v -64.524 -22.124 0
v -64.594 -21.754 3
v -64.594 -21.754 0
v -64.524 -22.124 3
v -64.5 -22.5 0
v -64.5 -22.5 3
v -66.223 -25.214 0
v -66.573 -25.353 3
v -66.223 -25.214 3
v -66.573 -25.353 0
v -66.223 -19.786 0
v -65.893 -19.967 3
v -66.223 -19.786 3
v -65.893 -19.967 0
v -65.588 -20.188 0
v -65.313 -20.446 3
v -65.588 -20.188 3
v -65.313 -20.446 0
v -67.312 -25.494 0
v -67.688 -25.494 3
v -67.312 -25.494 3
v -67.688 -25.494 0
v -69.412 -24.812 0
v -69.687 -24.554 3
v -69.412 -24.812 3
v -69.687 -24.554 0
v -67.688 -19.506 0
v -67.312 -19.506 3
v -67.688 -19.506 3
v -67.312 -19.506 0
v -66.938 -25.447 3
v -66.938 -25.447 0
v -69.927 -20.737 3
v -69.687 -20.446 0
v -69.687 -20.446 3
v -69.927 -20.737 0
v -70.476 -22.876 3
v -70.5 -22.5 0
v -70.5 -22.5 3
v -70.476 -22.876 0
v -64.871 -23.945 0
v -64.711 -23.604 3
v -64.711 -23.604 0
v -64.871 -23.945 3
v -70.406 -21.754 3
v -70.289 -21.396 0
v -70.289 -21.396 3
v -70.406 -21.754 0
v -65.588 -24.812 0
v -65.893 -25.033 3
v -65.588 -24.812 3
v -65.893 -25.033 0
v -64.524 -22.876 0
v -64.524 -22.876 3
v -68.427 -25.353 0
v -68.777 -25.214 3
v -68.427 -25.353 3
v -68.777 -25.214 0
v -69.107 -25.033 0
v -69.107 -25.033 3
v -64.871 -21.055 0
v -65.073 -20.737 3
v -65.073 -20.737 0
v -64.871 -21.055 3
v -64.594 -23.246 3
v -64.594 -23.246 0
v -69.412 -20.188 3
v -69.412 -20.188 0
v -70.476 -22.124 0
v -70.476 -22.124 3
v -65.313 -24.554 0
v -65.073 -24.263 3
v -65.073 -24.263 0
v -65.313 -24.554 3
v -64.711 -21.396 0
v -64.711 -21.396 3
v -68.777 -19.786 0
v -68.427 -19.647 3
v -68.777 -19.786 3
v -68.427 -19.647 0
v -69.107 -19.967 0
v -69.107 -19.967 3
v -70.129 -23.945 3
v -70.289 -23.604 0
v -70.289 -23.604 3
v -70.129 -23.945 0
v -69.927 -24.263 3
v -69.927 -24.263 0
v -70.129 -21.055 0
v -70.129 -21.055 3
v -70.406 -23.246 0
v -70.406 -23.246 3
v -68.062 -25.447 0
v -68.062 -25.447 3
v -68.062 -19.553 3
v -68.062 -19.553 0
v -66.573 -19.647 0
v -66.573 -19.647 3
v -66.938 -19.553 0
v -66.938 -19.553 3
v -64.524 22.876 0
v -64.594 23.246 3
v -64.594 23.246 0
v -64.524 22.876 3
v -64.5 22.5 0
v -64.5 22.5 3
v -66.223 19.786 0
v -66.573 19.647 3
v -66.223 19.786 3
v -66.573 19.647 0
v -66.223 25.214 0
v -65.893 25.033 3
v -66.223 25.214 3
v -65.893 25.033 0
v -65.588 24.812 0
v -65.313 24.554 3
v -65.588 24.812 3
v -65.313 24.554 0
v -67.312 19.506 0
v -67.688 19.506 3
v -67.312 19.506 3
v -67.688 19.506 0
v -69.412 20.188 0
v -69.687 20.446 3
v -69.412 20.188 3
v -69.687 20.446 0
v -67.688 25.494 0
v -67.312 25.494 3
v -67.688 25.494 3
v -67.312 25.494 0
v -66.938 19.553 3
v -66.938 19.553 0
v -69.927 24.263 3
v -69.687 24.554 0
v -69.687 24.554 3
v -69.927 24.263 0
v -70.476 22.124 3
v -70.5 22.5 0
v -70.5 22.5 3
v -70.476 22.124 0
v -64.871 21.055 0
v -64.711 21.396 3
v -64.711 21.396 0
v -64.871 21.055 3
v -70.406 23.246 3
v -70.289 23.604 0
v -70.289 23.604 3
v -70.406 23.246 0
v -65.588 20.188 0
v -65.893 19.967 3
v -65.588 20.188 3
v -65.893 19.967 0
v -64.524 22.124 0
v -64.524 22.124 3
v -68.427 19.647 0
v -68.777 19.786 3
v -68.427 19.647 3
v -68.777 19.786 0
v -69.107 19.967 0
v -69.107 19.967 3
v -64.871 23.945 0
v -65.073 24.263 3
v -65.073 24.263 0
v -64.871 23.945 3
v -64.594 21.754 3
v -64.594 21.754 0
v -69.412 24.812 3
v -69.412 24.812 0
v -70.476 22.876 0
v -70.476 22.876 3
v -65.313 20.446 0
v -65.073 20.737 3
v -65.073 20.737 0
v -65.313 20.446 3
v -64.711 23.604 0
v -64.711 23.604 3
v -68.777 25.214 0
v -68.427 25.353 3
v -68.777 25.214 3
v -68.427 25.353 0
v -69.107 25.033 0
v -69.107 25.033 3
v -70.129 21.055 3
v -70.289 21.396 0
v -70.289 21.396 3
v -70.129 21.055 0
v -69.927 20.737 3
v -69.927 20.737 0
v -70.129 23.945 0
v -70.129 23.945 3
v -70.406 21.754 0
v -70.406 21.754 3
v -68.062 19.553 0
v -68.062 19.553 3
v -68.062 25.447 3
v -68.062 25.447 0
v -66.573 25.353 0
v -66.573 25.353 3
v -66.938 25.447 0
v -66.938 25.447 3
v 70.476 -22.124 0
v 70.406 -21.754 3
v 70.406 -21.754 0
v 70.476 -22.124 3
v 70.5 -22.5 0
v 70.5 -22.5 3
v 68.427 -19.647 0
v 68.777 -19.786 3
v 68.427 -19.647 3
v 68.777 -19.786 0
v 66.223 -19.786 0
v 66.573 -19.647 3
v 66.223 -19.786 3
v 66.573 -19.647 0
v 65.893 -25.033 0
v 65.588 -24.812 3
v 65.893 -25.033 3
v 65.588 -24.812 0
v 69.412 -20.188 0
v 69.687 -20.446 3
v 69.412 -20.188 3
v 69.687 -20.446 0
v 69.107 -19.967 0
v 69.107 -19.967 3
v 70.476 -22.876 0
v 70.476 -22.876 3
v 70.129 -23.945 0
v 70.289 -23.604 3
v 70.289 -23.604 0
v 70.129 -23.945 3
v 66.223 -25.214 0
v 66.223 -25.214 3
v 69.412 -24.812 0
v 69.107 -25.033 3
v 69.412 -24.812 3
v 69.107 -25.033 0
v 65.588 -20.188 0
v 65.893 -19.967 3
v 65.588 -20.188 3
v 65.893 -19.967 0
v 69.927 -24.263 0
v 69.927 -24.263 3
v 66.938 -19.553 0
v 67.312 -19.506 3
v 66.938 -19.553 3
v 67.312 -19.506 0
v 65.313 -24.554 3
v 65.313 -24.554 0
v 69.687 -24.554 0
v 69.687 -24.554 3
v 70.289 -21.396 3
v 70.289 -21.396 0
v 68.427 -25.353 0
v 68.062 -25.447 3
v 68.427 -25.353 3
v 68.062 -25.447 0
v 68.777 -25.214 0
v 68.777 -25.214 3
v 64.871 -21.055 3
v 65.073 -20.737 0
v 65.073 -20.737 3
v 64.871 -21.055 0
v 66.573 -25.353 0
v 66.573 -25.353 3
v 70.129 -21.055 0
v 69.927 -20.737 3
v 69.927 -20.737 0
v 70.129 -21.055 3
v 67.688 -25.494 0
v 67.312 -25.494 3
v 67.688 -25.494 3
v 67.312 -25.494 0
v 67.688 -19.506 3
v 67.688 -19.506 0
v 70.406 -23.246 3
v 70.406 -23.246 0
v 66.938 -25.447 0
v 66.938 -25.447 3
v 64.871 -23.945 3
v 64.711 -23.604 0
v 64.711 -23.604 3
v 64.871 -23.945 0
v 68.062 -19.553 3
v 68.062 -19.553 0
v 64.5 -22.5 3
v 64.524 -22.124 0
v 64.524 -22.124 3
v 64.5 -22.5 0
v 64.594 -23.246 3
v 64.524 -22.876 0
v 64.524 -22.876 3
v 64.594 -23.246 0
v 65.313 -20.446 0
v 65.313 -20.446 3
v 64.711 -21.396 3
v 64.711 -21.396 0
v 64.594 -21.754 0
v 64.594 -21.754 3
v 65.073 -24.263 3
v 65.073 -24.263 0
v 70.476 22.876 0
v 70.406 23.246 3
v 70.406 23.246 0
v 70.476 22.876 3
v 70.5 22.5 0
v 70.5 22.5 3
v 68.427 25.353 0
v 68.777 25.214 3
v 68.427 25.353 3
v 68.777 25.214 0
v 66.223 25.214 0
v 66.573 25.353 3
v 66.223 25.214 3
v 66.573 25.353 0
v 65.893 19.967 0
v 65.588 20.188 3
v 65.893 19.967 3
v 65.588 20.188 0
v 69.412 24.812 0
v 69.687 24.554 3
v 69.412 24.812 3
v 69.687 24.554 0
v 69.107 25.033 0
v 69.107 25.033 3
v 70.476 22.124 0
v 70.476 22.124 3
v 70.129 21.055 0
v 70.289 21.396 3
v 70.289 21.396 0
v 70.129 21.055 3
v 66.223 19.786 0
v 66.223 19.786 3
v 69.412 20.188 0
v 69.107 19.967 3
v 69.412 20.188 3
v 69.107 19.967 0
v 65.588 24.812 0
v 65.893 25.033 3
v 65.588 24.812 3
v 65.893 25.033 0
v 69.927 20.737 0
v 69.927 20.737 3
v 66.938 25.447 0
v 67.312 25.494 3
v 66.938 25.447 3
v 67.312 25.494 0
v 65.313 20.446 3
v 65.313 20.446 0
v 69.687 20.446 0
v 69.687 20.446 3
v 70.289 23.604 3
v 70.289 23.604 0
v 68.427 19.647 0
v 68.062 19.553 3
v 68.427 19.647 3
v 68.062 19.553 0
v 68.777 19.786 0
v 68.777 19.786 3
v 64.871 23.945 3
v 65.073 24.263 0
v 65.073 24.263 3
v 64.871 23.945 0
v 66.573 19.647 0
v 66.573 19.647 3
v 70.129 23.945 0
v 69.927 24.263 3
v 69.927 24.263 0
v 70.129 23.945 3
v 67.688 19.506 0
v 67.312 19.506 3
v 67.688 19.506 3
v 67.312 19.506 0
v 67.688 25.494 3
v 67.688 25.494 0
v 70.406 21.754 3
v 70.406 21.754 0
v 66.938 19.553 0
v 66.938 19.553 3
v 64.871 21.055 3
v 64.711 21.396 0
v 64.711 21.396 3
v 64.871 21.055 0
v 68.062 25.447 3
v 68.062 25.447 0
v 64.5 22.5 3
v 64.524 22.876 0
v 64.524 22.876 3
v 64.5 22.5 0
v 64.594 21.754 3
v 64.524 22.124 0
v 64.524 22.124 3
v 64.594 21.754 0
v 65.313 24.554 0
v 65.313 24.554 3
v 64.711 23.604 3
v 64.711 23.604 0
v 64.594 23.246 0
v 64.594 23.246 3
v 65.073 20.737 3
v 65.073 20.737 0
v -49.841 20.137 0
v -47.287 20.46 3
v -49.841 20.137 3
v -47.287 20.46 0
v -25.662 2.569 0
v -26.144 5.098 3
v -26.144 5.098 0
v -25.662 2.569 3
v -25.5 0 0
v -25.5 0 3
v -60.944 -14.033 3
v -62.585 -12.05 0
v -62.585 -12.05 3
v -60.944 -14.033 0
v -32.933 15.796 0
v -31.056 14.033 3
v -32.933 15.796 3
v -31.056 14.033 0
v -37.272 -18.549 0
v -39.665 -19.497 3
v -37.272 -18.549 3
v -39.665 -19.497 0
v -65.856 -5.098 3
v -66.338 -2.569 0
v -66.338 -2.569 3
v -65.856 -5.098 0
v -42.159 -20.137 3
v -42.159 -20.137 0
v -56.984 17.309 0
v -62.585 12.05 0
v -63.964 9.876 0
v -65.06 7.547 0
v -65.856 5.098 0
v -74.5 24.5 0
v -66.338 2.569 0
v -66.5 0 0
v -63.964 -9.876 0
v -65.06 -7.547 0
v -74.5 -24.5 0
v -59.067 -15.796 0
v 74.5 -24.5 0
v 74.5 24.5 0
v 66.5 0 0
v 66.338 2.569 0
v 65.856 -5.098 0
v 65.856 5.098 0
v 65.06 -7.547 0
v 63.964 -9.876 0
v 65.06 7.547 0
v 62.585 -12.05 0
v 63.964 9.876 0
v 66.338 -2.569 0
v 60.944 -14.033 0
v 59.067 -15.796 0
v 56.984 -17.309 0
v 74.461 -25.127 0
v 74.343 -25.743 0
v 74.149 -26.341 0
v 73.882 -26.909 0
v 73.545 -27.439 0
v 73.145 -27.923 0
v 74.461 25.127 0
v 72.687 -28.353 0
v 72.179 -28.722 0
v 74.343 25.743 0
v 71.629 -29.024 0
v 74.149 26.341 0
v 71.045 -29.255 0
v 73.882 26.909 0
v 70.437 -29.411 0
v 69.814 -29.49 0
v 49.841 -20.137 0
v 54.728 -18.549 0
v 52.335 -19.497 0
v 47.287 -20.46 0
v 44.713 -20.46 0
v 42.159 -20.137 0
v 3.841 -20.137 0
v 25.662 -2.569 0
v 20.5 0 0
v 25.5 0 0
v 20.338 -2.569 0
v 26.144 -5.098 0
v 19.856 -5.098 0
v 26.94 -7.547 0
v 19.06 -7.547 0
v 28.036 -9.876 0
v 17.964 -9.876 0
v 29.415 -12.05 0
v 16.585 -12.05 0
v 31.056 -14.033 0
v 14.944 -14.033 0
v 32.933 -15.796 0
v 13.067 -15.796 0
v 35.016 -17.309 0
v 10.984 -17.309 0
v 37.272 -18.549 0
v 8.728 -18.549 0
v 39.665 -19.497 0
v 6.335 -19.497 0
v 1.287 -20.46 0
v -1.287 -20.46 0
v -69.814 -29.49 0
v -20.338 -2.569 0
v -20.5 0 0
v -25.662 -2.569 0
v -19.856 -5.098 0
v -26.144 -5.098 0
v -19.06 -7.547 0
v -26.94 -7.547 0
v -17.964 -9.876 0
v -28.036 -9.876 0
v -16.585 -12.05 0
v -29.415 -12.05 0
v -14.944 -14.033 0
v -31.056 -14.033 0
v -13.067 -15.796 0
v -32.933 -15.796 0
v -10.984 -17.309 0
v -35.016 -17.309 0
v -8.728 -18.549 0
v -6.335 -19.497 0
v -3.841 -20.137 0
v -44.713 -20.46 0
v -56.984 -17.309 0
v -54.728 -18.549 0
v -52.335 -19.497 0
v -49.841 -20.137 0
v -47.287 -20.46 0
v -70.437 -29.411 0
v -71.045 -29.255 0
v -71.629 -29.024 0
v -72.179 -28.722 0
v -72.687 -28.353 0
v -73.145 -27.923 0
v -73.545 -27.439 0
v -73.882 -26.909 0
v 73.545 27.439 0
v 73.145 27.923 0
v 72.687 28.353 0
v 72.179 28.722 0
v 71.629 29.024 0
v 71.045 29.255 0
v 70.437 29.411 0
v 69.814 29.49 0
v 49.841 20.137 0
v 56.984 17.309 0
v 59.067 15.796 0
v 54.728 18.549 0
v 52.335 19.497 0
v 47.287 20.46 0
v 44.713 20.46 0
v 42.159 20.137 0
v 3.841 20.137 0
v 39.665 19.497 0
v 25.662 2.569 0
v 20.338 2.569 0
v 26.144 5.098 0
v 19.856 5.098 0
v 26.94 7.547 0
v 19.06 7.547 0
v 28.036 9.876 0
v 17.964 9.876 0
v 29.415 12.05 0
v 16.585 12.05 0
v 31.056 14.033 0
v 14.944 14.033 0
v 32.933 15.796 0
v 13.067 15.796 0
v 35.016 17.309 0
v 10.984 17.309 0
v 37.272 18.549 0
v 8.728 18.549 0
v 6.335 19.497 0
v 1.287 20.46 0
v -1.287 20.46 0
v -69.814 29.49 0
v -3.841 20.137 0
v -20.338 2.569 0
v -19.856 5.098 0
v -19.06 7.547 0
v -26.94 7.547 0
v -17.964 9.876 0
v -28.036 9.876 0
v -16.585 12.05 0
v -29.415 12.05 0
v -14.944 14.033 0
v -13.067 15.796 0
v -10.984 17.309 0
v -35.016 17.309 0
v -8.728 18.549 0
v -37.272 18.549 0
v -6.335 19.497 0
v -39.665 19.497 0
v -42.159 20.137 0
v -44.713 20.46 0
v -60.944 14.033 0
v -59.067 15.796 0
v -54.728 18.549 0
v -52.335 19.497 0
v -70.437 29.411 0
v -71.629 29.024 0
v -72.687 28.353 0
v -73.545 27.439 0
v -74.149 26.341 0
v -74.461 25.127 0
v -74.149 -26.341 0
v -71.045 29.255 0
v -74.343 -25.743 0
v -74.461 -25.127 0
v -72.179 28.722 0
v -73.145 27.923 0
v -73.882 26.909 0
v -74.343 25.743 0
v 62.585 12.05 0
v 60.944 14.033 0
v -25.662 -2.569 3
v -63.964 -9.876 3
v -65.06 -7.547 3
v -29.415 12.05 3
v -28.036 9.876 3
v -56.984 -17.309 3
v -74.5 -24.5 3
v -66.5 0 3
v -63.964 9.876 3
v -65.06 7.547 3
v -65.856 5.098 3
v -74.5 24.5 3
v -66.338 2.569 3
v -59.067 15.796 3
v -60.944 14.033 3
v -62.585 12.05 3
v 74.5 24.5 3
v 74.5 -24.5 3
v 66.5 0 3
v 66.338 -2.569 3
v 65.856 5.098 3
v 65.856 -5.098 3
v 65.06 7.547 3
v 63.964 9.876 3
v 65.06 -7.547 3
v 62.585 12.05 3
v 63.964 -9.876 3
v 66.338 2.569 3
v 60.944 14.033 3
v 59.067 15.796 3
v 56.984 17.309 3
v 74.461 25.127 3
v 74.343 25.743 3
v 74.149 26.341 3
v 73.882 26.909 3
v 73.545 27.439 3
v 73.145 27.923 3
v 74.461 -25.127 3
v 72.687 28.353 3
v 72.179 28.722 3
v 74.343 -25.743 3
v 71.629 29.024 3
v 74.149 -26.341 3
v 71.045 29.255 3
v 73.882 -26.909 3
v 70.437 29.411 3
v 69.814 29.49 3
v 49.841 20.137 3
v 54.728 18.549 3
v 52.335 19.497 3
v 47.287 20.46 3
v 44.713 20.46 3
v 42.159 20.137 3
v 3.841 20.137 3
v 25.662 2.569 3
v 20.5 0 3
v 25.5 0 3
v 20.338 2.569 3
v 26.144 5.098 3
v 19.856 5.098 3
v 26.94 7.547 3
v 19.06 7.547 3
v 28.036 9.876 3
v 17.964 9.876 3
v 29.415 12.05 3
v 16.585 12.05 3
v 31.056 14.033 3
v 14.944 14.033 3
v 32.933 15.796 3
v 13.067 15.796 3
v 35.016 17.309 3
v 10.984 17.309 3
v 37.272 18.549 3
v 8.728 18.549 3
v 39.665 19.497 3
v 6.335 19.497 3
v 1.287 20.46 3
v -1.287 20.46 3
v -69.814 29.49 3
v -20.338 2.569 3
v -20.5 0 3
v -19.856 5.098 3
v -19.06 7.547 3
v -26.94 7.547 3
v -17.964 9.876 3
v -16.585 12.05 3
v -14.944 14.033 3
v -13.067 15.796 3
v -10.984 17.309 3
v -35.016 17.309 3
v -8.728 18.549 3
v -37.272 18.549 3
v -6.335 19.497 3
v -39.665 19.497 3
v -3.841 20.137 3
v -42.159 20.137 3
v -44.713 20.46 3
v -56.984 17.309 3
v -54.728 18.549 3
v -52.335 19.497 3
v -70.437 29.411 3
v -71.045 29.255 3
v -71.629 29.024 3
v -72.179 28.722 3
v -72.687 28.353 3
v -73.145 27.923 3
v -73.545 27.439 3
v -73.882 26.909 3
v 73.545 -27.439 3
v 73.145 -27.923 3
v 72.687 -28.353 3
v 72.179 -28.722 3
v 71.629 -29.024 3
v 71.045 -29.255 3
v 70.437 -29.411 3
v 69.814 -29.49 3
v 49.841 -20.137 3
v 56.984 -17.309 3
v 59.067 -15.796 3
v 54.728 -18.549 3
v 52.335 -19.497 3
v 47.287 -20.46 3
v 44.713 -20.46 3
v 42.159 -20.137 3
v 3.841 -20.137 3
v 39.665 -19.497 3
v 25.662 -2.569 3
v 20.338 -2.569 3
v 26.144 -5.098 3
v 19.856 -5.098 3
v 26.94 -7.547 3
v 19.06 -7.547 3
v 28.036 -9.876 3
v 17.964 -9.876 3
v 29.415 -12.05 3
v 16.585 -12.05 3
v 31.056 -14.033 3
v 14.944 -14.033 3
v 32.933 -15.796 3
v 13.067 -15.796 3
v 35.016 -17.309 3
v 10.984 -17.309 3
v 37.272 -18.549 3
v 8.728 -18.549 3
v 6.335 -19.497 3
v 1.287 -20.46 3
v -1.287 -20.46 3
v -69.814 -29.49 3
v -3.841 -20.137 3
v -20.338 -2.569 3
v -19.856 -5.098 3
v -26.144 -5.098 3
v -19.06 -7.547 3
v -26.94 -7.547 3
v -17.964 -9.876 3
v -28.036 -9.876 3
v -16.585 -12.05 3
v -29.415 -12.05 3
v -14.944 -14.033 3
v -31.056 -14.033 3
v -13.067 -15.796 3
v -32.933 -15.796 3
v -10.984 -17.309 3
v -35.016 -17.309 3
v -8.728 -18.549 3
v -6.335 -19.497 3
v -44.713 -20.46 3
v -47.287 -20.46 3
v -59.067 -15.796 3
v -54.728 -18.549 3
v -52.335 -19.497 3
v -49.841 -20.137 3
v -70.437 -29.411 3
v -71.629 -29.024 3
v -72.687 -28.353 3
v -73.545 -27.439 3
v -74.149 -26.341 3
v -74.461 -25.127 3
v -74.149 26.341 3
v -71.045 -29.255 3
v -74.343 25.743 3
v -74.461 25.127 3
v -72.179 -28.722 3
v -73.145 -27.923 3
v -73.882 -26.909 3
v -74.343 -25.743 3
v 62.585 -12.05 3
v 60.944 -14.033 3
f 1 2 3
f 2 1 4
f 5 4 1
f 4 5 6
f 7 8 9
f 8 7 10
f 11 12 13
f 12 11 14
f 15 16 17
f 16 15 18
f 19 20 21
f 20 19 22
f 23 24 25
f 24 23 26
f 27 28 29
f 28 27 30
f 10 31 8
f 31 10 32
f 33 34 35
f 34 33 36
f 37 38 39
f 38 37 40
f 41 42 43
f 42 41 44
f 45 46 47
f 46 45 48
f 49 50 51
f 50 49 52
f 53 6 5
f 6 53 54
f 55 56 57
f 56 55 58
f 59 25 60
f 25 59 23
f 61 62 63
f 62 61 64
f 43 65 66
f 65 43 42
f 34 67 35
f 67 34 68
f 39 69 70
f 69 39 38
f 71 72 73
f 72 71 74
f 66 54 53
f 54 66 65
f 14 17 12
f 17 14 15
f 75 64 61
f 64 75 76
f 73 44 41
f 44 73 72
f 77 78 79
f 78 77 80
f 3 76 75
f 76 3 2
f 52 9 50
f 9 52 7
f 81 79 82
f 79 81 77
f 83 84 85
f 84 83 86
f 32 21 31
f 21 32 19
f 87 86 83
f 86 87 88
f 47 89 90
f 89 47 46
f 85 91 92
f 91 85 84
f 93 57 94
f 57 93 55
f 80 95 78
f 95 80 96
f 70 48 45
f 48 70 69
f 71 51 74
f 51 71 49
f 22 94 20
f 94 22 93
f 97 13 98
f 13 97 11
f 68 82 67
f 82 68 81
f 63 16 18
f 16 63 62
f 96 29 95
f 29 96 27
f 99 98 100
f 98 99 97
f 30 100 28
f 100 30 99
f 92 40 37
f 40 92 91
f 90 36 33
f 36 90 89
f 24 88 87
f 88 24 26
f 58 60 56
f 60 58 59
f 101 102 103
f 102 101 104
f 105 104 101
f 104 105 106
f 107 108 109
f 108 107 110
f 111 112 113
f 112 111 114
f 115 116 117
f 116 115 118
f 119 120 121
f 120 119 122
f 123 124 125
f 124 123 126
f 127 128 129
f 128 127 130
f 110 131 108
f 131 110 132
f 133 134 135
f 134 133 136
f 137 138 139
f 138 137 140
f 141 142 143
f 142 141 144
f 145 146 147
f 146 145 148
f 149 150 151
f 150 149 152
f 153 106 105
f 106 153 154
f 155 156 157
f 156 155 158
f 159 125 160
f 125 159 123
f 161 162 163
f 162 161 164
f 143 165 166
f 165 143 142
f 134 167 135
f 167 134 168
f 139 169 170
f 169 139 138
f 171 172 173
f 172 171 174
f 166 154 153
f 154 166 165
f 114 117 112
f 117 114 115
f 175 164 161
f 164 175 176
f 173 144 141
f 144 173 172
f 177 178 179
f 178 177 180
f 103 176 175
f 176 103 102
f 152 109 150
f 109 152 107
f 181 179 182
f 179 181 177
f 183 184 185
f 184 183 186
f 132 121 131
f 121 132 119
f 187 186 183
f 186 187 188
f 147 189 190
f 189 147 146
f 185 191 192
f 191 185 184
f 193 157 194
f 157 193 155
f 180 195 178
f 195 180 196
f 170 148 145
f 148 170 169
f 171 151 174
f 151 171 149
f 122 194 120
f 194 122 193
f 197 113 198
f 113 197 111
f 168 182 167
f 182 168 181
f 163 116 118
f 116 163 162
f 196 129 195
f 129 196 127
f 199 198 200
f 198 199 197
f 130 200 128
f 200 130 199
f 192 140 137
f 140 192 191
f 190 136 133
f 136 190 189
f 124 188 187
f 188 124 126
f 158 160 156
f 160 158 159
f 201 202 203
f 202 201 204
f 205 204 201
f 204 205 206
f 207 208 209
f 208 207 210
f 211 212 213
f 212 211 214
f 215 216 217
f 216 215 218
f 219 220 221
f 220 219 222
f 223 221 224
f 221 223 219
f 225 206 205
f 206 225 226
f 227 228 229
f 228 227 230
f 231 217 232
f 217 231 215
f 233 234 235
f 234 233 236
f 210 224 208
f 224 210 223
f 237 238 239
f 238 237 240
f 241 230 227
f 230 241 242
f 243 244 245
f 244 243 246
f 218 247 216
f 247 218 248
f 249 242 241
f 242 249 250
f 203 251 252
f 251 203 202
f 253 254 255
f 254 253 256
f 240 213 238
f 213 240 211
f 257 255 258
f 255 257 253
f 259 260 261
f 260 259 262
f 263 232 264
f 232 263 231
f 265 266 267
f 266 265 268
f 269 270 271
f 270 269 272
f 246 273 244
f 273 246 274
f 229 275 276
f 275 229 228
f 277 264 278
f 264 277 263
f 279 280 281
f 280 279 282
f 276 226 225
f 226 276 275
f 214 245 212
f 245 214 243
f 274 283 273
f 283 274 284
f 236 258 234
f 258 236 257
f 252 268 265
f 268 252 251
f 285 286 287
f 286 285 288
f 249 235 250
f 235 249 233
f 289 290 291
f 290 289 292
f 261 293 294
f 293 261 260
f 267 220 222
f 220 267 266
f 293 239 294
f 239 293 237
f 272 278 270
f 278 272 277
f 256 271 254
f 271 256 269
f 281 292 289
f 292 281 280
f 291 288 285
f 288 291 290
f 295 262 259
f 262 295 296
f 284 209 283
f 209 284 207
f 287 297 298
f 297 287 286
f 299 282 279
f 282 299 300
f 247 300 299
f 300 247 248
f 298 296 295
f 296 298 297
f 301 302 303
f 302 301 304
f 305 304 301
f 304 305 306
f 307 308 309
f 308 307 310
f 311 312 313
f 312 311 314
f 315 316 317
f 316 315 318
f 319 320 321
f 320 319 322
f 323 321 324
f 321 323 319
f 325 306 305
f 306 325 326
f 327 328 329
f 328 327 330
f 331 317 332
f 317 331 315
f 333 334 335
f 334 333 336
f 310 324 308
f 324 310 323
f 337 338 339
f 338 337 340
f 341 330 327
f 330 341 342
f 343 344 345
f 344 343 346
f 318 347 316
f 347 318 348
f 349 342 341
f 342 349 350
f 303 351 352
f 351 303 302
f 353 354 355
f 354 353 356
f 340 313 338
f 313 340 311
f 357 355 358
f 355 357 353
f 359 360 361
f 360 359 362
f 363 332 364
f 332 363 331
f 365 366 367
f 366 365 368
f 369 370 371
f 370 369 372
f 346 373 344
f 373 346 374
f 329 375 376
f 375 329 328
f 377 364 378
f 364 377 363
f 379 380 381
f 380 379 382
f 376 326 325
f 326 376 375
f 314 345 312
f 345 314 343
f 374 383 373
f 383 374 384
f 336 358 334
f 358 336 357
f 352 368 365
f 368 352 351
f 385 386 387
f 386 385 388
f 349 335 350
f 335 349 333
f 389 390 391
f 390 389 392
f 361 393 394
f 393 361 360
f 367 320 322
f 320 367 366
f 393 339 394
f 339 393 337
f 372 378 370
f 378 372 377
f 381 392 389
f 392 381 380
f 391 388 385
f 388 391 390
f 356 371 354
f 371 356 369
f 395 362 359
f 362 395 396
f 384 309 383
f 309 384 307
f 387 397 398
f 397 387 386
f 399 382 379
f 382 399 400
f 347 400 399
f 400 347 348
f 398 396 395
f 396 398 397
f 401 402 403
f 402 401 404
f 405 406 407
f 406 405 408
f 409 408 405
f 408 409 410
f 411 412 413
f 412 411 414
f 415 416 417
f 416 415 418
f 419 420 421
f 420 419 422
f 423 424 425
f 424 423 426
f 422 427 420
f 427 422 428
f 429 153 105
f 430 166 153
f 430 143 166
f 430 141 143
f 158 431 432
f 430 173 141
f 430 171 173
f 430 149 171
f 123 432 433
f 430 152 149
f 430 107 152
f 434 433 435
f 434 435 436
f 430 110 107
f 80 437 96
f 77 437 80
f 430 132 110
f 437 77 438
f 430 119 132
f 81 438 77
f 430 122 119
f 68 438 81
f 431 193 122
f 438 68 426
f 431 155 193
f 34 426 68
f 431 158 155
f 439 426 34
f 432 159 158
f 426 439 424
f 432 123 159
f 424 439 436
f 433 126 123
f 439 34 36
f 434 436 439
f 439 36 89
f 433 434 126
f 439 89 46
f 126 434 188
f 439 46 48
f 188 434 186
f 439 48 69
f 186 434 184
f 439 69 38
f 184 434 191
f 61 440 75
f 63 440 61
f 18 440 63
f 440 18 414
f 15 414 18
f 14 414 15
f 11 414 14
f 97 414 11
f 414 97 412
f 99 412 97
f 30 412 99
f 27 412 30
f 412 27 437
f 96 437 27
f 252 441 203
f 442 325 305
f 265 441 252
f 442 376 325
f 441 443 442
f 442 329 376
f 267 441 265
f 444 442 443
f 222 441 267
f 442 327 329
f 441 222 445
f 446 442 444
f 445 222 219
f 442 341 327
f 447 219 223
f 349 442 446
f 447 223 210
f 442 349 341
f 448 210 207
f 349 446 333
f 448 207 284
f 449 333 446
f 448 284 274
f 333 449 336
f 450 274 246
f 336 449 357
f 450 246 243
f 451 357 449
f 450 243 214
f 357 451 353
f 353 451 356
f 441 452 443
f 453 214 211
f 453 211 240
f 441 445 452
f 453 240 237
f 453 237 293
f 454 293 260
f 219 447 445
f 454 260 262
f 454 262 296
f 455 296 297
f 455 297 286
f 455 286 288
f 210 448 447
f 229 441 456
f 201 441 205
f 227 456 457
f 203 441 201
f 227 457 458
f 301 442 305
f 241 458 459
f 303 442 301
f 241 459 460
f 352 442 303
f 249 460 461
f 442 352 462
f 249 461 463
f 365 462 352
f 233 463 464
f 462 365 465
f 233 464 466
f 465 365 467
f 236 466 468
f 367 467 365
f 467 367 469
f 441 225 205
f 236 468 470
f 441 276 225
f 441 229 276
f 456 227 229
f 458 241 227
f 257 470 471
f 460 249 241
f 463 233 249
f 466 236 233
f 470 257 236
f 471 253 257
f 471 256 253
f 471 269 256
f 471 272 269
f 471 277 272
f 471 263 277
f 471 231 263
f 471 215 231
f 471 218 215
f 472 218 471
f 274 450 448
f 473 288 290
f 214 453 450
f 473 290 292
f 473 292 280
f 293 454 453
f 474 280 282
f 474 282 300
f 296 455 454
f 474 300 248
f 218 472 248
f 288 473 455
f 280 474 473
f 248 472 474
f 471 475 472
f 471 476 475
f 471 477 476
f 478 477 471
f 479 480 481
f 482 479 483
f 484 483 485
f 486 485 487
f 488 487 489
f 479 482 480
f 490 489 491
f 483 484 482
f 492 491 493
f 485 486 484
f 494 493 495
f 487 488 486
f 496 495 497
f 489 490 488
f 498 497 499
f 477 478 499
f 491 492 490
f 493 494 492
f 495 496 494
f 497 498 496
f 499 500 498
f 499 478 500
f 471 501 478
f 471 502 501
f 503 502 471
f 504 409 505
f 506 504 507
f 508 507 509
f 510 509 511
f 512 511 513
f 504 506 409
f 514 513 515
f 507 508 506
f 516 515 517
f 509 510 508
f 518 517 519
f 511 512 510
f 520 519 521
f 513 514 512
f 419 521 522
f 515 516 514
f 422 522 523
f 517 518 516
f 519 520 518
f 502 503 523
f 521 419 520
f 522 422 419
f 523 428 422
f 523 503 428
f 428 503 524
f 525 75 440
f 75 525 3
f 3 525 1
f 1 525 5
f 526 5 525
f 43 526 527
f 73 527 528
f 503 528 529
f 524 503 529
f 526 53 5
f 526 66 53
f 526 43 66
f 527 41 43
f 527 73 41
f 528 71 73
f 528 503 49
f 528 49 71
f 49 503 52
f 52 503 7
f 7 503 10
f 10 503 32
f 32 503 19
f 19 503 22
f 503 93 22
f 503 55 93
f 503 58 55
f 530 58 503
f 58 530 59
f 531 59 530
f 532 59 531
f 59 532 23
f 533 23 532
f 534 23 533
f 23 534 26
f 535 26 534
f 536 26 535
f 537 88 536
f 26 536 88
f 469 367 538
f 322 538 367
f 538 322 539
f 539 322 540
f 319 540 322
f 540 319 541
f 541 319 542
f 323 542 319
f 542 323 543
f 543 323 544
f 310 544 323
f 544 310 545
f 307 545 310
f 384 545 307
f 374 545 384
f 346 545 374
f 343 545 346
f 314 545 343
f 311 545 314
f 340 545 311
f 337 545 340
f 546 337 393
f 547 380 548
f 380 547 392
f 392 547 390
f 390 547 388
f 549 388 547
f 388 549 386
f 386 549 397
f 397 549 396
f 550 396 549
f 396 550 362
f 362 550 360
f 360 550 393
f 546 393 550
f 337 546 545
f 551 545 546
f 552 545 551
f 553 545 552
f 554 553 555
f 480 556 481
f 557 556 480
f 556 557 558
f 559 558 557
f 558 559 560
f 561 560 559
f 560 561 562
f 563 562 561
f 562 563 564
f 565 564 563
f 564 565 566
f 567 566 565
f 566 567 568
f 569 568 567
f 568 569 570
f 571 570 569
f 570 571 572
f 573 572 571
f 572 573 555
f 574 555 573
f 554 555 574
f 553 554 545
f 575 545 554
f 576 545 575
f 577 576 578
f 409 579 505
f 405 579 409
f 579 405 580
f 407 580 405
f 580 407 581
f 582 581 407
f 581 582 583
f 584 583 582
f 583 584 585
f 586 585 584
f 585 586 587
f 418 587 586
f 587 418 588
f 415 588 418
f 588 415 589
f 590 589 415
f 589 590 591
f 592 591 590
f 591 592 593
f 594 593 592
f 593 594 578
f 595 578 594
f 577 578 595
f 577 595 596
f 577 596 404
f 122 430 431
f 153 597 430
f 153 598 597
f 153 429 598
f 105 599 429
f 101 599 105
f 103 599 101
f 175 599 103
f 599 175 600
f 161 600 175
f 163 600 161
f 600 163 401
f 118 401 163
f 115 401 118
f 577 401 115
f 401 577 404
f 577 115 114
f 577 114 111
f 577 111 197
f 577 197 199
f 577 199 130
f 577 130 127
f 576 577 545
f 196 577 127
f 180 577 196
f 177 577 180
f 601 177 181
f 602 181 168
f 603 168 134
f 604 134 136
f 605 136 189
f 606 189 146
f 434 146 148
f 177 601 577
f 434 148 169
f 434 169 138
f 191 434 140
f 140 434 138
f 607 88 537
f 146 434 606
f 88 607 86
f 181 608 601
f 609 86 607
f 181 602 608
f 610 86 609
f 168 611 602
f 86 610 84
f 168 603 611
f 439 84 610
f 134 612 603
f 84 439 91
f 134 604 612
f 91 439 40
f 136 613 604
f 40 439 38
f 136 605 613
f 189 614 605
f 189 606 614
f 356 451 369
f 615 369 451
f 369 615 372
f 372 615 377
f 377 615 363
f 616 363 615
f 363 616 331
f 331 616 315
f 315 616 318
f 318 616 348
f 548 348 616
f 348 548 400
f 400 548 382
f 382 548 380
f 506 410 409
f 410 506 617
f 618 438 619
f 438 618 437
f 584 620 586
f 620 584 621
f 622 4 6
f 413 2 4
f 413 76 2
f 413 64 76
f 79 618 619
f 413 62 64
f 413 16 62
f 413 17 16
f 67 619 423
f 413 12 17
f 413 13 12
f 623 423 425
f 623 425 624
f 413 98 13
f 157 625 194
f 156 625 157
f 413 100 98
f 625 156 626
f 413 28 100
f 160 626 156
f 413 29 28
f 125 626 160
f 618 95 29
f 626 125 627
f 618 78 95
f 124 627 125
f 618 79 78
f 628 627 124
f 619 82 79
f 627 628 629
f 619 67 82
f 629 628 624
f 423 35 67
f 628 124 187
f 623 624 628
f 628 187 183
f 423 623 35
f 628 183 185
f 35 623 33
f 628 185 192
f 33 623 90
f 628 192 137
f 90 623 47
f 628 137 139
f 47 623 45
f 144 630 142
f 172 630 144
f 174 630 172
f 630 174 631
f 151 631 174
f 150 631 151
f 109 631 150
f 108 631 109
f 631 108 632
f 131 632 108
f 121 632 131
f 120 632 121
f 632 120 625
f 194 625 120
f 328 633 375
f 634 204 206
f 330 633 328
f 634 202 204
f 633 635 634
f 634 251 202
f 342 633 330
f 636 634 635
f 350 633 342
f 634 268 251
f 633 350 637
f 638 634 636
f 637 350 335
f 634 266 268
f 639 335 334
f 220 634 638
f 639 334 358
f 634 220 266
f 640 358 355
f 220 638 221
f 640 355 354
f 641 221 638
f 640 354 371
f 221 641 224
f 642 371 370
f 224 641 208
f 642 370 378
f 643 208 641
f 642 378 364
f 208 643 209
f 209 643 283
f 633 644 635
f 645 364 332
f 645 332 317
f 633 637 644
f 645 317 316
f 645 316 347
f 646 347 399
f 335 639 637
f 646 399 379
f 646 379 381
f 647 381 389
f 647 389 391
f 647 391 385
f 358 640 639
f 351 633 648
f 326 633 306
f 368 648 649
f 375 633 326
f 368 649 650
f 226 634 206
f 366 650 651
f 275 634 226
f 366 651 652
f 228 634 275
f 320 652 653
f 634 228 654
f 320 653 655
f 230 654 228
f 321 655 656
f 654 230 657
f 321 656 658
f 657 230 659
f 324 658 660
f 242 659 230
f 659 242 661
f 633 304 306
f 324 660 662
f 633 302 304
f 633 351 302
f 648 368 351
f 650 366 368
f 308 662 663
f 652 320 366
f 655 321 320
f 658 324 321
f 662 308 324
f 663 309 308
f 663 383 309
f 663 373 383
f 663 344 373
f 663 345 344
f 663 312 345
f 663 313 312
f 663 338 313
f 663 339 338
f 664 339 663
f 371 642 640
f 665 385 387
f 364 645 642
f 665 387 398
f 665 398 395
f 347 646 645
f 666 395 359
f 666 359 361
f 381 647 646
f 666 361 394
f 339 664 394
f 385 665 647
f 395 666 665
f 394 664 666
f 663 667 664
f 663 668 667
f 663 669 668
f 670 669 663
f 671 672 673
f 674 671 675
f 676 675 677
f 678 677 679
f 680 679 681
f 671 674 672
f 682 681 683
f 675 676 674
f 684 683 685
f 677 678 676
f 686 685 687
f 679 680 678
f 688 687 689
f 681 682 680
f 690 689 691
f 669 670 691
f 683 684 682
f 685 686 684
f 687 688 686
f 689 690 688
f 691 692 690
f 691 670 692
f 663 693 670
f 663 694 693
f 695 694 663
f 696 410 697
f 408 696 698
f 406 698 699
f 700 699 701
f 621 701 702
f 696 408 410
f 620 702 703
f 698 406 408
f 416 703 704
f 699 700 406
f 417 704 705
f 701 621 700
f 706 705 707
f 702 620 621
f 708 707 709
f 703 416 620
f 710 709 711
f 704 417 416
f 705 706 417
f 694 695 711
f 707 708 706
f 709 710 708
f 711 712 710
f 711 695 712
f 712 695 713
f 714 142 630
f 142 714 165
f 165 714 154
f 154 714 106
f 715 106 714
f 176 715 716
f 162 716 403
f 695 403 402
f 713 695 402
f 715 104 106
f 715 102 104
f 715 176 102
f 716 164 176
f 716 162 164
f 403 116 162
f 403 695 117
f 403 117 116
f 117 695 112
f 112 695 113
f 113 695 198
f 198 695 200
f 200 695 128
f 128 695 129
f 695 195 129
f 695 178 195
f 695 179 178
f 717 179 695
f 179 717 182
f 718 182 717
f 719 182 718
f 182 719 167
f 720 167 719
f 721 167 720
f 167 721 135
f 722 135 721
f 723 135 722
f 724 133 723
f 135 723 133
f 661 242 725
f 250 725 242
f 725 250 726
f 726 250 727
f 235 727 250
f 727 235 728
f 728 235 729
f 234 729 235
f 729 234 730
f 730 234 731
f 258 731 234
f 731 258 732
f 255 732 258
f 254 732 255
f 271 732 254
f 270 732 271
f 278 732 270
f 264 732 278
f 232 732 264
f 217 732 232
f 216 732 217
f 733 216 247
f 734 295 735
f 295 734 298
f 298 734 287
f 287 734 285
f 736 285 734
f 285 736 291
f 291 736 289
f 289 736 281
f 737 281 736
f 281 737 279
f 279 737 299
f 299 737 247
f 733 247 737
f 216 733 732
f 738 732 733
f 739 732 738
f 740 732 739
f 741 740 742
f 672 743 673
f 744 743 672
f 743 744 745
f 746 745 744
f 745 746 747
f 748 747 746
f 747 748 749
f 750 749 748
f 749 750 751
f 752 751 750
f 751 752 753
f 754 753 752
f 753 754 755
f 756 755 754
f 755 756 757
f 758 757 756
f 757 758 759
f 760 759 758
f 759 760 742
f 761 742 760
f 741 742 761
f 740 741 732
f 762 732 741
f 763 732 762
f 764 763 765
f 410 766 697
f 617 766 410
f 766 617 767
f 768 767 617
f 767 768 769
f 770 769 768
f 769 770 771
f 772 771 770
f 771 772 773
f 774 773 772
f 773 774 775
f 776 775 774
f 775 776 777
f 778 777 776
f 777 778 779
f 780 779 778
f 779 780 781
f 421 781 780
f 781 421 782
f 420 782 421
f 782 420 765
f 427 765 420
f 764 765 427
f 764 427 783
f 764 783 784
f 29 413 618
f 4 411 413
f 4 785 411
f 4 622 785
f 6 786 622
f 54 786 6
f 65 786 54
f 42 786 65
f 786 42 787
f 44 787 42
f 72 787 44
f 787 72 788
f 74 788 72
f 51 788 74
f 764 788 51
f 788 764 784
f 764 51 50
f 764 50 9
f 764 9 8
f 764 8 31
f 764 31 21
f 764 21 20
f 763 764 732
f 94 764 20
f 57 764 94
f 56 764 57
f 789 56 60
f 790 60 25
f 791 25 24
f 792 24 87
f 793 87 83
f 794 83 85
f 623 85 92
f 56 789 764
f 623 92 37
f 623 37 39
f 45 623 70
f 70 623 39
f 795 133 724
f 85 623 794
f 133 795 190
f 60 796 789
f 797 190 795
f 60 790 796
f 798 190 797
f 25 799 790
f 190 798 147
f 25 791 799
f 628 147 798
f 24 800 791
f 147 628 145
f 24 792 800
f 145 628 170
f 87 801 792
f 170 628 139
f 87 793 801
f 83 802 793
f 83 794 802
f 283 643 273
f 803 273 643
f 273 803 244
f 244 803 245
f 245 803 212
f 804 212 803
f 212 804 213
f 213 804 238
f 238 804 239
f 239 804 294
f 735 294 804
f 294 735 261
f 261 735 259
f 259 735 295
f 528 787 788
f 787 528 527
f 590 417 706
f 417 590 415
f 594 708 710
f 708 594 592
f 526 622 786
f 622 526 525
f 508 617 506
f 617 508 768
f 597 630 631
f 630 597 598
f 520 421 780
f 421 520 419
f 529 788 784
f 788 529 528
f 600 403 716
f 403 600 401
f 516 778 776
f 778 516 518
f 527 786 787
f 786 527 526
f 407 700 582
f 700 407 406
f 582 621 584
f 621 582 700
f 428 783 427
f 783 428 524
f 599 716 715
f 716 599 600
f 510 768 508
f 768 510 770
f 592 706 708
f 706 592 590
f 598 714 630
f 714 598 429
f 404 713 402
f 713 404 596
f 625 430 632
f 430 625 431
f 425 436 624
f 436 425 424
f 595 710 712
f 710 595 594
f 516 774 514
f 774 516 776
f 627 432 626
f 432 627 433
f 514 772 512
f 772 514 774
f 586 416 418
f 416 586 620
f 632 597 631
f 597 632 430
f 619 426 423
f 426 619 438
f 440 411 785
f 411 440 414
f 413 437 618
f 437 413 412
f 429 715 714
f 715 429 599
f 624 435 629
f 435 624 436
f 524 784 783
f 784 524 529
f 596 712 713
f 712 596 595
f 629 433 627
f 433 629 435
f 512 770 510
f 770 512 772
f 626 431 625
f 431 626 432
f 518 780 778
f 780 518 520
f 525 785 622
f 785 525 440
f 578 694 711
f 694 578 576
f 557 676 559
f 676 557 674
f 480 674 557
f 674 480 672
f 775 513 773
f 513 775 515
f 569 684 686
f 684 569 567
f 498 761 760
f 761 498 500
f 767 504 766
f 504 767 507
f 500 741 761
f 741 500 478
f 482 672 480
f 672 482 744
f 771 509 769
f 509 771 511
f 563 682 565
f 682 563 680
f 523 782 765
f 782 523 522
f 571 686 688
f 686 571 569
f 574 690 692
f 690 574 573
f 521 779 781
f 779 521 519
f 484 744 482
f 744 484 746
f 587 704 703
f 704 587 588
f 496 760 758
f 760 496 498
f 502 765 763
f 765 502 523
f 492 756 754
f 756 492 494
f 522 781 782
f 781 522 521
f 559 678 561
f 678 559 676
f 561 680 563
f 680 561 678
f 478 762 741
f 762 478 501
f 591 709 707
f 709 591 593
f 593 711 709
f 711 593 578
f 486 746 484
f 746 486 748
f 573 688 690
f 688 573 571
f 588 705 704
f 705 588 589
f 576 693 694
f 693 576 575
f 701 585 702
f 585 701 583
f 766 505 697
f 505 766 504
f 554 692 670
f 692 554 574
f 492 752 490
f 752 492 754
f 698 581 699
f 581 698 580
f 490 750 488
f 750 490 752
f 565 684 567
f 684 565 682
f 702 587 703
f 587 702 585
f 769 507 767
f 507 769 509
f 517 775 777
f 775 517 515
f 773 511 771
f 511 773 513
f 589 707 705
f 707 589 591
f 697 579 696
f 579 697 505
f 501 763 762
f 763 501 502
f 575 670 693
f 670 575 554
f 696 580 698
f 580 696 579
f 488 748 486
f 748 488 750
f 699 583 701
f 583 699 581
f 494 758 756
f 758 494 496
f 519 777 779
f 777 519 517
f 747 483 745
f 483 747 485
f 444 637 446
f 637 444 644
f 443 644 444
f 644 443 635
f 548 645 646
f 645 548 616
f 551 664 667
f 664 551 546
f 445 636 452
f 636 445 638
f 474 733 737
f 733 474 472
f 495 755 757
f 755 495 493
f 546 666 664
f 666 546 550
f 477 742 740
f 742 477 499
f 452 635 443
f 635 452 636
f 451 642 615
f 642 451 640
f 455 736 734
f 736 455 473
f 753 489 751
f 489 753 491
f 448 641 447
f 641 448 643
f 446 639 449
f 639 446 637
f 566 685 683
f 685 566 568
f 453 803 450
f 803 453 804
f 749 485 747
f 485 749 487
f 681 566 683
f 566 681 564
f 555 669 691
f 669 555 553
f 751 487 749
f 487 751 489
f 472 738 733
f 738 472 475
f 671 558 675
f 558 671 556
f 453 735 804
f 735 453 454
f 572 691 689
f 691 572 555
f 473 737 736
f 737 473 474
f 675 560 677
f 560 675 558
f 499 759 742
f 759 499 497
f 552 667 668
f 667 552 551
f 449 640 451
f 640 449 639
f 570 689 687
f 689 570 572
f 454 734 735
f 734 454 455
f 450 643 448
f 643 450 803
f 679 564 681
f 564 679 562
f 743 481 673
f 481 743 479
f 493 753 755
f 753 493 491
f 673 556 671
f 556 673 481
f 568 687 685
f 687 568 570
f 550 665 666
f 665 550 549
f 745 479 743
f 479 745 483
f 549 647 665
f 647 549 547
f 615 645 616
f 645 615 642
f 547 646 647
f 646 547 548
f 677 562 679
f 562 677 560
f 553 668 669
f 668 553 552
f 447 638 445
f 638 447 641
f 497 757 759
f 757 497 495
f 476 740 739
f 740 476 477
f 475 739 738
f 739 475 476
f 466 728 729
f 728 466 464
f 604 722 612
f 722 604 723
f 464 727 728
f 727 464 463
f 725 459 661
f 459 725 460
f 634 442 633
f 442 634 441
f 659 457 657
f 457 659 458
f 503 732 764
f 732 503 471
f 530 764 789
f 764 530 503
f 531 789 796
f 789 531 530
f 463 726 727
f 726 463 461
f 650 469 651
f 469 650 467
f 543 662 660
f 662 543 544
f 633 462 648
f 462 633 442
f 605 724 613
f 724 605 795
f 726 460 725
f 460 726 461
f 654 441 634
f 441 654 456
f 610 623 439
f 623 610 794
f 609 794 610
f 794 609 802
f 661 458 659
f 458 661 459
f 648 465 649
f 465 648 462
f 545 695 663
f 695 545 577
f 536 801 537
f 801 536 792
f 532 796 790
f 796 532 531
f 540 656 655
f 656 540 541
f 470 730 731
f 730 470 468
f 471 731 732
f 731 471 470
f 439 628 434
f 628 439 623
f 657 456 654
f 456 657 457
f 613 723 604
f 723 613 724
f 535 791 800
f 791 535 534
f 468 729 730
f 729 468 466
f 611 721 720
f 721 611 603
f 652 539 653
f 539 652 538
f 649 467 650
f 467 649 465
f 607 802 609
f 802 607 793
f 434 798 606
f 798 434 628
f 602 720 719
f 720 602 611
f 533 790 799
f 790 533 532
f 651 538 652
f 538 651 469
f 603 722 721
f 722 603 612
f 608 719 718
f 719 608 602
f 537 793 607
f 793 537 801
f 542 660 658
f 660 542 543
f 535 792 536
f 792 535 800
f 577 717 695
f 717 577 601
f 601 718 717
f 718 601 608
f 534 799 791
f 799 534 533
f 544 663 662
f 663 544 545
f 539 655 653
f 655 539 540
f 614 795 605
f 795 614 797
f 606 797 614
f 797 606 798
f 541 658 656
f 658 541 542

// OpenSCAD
$fn = 50;


difference() {
	union() {
		hull() {
			translate(v = [-69.5000000000, 24.5000000000, 0]) {
				cylinder(h = 3, r = 5);
			}
			translate(v = [69.5000000000, 24.5000000000, 0]) {
				cylinder(h = 3, r = 5);
			}
			translate(v = [-69.5000000000, -24.5000000000, 0]) {
				cylinder(h = 3, r = 5);
			}
			translate(v = [69.5000000000, -24.5000000000, 0]) {
				cylinder(h = 3, r = 5);
			}
		}
	}
	union() {
		#translate(v = [-67.5000000000, -22.5000000000, -100.0000000000]) {
			cylinder(h = 200, r = 3.0000000000);
		}
		#translate(v = [-67.5000000000, 22.5000000000, -100.0000000000]) {
			cylinder(h = 200, r = 3.0000000000);
		}
		#translate(v = [67.5000000000, -22.5000000000, -100.0000000000]) {
			cylinder(h = 200, r = 3.0000000000);
		}
		#translate(v = [67.5000000000, 22.5000000000, -100.0000000000]) {
			cylinder(h = 200, r = 3.0000000000);
		}
		#translate(v = [-46.0000000000, 0, 0]) {
			cylinder(h = 3, r = 20.5000000000);
		}
		#cylinder(h = 3, r = 20.5000000000);
		#translate(v = [46.0000000000, 0, 0]) {
			cylinder(h = 3, r = 20.5000000000);
		}
	}
}
